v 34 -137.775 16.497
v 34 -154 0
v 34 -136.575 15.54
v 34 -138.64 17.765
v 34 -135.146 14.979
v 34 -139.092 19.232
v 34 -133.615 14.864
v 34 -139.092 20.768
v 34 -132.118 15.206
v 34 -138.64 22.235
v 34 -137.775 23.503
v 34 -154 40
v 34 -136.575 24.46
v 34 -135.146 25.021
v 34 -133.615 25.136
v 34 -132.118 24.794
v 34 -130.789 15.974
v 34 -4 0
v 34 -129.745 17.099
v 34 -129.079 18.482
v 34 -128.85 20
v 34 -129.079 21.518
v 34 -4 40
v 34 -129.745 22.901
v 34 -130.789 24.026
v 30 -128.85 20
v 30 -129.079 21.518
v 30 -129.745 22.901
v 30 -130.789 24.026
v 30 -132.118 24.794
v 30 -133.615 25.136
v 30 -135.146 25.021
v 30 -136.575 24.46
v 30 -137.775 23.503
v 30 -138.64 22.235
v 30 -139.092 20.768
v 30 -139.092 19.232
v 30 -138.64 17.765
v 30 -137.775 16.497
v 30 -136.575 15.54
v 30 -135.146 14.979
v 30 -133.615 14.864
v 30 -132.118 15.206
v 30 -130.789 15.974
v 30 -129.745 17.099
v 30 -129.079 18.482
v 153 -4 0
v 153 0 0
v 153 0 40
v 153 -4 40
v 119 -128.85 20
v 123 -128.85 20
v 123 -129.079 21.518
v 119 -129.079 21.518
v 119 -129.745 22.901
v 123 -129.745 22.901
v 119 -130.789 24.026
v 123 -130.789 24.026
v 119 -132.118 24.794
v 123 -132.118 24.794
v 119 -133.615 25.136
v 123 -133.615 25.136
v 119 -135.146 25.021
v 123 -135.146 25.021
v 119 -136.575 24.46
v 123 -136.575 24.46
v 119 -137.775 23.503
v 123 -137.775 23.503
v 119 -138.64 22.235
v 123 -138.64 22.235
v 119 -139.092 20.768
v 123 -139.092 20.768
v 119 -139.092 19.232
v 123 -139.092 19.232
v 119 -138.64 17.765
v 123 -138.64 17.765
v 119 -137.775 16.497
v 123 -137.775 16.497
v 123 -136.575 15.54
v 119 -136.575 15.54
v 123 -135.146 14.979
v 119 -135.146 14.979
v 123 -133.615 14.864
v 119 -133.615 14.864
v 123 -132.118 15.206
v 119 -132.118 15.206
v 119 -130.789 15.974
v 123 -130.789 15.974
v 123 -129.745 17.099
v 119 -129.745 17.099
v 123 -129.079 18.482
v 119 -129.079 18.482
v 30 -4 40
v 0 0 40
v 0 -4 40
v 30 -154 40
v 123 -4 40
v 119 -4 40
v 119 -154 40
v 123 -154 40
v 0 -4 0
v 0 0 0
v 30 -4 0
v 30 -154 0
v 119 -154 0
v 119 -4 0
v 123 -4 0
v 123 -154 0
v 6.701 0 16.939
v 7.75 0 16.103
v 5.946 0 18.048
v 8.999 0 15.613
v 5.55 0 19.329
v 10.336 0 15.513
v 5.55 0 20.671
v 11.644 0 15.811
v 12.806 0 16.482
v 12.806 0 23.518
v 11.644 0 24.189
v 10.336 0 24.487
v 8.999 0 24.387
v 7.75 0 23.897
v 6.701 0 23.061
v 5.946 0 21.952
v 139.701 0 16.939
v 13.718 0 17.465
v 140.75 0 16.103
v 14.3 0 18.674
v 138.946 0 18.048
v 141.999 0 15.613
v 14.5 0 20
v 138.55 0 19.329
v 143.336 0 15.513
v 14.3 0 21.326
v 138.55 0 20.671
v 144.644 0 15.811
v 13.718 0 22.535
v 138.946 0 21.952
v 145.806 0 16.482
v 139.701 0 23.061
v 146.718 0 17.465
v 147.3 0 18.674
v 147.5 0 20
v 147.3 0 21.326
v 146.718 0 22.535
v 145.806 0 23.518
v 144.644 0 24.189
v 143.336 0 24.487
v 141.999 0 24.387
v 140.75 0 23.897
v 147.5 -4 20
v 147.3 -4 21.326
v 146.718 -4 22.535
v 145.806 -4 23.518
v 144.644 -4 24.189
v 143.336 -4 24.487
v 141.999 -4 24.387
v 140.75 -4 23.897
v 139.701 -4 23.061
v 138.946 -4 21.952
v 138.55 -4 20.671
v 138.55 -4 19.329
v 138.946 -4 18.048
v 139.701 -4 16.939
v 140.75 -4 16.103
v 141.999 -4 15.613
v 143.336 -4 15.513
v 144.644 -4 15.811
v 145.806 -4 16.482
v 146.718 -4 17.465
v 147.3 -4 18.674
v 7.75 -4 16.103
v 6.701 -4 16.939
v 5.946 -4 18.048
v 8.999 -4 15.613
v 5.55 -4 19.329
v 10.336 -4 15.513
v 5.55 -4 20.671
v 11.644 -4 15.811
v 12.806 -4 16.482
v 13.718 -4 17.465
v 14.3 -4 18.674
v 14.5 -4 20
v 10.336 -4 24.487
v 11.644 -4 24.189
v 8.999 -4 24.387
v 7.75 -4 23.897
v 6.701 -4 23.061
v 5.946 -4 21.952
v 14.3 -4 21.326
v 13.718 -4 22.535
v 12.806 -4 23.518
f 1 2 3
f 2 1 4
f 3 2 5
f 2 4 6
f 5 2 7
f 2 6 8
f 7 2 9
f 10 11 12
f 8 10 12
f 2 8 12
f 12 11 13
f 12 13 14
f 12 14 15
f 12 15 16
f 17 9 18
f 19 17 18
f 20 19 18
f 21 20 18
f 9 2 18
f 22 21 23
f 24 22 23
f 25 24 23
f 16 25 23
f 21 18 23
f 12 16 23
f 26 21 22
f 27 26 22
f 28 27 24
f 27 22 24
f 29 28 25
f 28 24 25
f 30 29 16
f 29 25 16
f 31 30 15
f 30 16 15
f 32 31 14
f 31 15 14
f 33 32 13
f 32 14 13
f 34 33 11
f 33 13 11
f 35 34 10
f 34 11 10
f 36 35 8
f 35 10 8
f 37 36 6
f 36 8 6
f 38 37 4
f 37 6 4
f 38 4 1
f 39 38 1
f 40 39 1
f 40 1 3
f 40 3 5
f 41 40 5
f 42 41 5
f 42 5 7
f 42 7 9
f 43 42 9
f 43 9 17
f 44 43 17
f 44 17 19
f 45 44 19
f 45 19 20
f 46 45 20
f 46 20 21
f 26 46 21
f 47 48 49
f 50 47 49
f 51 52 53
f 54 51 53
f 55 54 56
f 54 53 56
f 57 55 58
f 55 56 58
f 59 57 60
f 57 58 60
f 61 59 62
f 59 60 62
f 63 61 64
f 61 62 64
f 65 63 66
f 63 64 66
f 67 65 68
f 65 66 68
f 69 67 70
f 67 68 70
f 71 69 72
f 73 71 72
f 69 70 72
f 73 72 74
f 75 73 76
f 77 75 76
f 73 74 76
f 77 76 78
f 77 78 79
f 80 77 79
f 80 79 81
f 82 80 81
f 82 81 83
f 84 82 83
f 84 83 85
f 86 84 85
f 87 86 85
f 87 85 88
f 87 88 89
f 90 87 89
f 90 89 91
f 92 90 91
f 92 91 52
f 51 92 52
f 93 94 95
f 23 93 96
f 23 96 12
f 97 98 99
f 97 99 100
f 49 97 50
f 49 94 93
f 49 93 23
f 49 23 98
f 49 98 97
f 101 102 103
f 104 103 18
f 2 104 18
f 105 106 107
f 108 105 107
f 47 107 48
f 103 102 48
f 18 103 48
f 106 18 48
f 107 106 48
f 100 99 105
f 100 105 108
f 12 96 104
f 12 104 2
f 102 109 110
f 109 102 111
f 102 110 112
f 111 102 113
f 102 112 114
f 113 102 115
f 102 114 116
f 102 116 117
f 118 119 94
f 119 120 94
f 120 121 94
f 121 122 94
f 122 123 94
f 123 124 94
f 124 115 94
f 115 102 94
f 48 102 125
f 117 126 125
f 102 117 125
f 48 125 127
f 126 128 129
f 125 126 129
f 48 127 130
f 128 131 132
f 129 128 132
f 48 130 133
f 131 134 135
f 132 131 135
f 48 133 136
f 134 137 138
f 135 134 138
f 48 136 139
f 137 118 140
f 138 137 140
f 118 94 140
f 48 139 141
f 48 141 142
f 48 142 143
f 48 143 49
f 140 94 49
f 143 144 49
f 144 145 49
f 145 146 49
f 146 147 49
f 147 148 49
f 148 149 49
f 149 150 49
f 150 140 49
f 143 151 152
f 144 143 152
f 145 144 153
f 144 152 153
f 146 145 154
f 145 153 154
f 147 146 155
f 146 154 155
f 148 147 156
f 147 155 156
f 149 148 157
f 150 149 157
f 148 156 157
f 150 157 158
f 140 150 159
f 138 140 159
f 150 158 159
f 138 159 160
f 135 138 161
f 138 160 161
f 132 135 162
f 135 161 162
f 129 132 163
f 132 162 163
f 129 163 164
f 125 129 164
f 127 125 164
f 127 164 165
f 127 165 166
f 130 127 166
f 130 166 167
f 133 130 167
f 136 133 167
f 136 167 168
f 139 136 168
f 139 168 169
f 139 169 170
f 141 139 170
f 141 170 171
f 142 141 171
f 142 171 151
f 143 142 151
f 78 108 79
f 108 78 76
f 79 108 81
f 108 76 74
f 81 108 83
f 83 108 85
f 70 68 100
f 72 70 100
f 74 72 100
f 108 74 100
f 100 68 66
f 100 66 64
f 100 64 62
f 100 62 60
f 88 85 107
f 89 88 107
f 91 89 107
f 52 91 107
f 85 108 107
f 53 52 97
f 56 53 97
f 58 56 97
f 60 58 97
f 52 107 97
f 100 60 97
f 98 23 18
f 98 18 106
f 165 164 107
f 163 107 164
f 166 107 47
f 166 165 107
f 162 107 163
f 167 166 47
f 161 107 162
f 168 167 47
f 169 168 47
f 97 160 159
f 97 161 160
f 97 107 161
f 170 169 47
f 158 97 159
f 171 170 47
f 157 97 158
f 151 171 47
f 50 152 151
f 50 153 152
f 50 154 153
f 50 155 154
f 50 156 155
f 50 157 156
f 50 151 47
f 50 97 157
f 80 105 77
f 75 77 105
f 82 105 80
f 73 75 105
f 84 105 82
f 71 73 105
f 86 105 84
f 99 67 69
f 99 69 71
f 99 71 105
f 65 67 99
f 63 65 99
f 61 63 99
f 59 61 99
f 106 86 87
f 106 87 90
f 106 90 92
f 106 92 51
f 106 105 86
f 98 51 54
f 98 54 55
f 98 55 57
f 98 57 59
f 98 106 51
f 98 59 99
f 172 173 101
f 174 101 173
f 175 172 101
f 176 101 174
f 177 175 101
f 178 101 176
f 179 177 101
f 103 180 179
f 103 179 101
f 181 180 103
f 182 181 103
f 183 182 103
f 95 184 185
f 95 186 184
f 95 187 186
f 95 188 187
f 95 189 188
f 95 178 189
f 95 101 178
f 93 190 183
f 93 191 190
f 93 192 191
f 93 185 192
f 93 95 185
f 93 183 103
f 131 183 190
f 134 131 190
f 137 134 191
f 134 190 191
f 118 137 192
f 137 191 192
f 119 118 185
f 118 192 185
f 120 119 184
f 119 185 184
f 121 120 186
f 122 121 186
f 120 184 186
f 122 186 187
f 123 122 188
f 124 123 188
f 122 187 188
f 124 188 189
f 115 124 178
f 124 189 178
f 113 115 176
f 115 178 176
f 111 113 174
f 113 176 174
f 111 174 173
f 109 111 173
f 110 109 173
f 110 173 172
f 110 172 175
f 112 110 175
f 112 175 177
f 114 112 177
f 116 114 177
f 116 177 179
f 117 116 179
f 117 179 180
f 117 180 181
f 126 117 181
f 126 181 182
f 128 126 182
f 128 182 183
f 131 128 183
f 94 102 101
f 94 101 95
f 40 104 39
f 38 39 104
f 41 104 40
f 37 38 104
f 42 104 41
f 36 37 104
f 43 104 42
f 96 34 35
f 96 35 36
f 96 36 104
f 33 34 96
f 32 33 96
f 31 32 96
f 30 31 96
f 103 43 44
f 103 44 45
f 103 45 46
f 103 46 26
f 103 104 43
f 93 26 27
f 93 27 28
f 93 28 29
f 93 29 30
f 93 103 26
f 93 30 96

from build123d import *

# Parameters (mm, degrees)
F0_W     = 153
F0_H     = 40
F1_DEPTH = 4
F2_W     = 4
F2_H     = 40
F3_DEPTH = 150
F4_R     = 4.5
F5_DEPTH = 25
F6_R     = 5.15
F7_DEPTH = 123.001


with BuildPart() as f1:
    # F0 (on Front) → F1 (new body)
    with BuildSketch(Plane.XZ):
        with Locations((76.5, 20)):
            Rectangle(F0_W, F0_H)
    extrude(amount=F1_DEPTH)

    # F2 (on face) → F3 (join)
    with BuildSketch(Plane.XZ.offset(4)):
        with Locations((32, 20)):
            Rectangle(F2_W, F2_H)
        with Locations((121, 20)):
            Rectangle(F2_W, F2_H)
    extrude(amount=F3_DEPTH)

    # F4 (on face) → F5 (cut)
    with BuildSketch(Plane.XZ.offset(4)):
        with Locations((143, 20)):
            Circle(F4_R)
        with Locations((10, 20)):
            Circle(F4_R)
    extrude(amount=-F5_DEPTH, mode=Mode.SUBTRACT)

    # F6 (on face) → F7 (cut, through all)
    with BuildSketch(Plane.YZ.offset(123)):
        with Locations((-134, 20)):
            Circle(F6_R)
    extrude(amount=-F7_DEPTH, mode=Mode.SUBTRACT)


solid = f1.part
